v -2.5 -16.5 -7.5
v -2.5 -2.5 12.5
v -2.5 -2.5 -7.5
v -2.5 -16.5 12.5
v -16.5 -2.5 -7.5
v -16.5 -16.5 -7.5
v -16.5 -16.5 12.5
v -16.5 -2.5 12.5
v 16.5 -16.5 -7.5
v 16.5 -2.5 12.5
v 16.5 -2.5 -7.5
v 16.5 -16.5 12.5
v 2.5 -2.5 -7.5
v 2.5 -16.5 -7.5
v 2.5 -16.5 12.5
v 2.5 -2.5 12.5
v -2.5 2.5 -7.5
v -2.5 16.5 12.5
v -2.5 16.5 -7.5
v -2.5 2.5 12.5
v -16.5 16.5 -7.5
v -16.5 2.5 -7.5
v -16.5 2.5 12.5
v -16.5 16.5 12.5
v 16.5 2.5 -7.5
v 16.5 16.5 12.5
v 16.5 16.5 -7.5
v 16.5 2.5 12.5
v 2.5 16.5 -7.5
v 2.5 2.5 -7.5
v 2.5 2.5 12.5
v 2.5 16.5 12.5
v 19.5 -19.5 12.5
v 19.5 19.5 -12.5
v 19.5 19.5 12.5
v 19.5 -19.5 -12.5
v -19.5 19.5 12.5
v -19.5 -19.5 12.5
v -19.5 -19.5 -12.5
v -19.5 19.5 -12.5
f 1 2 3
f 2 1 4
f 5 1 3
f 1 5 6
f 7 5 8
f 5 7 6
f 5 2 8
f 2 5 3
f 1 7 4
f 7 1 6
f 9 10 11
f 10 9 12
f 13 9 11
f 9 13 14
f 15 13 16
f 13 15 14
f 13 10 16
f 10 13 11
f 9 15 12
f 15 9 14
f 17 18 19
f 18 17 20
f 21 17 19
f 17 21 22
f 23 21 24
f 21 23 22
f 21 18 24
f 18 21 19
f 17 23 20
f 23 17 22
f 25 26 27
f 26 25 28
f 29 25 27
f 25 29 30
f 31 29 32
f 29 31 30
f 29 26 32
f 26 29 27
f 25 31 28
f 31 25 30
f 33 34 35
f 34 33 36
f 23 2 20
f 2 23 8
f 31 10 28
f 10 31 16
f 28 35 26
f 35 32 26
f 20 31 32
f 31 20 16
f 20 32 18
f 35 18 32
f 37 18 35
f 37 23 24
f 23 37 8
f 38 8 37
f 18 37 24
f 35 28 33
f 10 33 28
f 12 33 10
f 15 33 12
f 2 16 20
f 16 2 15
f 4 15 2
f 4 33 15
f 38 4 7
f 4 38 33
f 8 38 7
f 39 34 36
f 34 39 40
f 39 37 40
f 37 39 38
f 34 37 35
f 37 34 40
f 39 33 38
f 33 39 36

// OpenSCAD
$fn = 32;

// ----------------------------------------------------------------------
// Pocket plate 39 x 39 x 25
// 2 x 2 pockets 14 mm square, 20 mm deep
// ----------------------------------------------------------------------

// --- parameters (mm) ---
thickness = 25;  // plate thickness
floor_t = 5;     // material left under each pocket
pocket = 14;     // pocket side length
pitch_x = 19;    // pocket pitch along X
pitch_y = 19;    // pocket pitch along Y
cols = 2;        // pockets per row
rows = 2;        // rows of pockets

// --- derived feature positions (mm) ---
depth = thickness - floor_t;        // = 20   pocket depth, down to the floor
span_x = (cols - 1) * pitch_x;      // = 19   distance between outer pockets
span_y = (rows - 1) * pitch_y;      // = 19   distance between outer pocket rows
origin_x = -span_x / 2;             // = -9.5   X of the first pocket
origin_y = -span_y / 2;             // = -9.5   Y of the first pocket
plate = [span_x + pocket + 6, span_y + pocket + 6, thickness];  // = [39, 39, 25]   overall size: pockets plus 3 mm of wall on each side
feature_centers = [
  [origin_x + 0 * pitch_x, origin_y + 0 * pitch_y],
  [origin_x + 1 * pitch_x, origin_y + 0 * pitch_y],
  [origin_x + 0 * pitch_x, origin_y + 1 * pitch_y],
  [origin_x + 1 * pitch_x, origin_y + 1 * pitch_y]
];   // pocket centres, used verbatim by the cutter loop

// plate outline, then one pocket per centre in feature_centers
difference() {
  cube(plate, center = true);
  for (centre = feature_centers)
    translate([centre[0] - pocket / 2, centre[1] - pocket / 2, plate[2] / 2 - depth])
      cube([pocket, pocket, depth + 1]);  // centred on the declared pocket centre
}
